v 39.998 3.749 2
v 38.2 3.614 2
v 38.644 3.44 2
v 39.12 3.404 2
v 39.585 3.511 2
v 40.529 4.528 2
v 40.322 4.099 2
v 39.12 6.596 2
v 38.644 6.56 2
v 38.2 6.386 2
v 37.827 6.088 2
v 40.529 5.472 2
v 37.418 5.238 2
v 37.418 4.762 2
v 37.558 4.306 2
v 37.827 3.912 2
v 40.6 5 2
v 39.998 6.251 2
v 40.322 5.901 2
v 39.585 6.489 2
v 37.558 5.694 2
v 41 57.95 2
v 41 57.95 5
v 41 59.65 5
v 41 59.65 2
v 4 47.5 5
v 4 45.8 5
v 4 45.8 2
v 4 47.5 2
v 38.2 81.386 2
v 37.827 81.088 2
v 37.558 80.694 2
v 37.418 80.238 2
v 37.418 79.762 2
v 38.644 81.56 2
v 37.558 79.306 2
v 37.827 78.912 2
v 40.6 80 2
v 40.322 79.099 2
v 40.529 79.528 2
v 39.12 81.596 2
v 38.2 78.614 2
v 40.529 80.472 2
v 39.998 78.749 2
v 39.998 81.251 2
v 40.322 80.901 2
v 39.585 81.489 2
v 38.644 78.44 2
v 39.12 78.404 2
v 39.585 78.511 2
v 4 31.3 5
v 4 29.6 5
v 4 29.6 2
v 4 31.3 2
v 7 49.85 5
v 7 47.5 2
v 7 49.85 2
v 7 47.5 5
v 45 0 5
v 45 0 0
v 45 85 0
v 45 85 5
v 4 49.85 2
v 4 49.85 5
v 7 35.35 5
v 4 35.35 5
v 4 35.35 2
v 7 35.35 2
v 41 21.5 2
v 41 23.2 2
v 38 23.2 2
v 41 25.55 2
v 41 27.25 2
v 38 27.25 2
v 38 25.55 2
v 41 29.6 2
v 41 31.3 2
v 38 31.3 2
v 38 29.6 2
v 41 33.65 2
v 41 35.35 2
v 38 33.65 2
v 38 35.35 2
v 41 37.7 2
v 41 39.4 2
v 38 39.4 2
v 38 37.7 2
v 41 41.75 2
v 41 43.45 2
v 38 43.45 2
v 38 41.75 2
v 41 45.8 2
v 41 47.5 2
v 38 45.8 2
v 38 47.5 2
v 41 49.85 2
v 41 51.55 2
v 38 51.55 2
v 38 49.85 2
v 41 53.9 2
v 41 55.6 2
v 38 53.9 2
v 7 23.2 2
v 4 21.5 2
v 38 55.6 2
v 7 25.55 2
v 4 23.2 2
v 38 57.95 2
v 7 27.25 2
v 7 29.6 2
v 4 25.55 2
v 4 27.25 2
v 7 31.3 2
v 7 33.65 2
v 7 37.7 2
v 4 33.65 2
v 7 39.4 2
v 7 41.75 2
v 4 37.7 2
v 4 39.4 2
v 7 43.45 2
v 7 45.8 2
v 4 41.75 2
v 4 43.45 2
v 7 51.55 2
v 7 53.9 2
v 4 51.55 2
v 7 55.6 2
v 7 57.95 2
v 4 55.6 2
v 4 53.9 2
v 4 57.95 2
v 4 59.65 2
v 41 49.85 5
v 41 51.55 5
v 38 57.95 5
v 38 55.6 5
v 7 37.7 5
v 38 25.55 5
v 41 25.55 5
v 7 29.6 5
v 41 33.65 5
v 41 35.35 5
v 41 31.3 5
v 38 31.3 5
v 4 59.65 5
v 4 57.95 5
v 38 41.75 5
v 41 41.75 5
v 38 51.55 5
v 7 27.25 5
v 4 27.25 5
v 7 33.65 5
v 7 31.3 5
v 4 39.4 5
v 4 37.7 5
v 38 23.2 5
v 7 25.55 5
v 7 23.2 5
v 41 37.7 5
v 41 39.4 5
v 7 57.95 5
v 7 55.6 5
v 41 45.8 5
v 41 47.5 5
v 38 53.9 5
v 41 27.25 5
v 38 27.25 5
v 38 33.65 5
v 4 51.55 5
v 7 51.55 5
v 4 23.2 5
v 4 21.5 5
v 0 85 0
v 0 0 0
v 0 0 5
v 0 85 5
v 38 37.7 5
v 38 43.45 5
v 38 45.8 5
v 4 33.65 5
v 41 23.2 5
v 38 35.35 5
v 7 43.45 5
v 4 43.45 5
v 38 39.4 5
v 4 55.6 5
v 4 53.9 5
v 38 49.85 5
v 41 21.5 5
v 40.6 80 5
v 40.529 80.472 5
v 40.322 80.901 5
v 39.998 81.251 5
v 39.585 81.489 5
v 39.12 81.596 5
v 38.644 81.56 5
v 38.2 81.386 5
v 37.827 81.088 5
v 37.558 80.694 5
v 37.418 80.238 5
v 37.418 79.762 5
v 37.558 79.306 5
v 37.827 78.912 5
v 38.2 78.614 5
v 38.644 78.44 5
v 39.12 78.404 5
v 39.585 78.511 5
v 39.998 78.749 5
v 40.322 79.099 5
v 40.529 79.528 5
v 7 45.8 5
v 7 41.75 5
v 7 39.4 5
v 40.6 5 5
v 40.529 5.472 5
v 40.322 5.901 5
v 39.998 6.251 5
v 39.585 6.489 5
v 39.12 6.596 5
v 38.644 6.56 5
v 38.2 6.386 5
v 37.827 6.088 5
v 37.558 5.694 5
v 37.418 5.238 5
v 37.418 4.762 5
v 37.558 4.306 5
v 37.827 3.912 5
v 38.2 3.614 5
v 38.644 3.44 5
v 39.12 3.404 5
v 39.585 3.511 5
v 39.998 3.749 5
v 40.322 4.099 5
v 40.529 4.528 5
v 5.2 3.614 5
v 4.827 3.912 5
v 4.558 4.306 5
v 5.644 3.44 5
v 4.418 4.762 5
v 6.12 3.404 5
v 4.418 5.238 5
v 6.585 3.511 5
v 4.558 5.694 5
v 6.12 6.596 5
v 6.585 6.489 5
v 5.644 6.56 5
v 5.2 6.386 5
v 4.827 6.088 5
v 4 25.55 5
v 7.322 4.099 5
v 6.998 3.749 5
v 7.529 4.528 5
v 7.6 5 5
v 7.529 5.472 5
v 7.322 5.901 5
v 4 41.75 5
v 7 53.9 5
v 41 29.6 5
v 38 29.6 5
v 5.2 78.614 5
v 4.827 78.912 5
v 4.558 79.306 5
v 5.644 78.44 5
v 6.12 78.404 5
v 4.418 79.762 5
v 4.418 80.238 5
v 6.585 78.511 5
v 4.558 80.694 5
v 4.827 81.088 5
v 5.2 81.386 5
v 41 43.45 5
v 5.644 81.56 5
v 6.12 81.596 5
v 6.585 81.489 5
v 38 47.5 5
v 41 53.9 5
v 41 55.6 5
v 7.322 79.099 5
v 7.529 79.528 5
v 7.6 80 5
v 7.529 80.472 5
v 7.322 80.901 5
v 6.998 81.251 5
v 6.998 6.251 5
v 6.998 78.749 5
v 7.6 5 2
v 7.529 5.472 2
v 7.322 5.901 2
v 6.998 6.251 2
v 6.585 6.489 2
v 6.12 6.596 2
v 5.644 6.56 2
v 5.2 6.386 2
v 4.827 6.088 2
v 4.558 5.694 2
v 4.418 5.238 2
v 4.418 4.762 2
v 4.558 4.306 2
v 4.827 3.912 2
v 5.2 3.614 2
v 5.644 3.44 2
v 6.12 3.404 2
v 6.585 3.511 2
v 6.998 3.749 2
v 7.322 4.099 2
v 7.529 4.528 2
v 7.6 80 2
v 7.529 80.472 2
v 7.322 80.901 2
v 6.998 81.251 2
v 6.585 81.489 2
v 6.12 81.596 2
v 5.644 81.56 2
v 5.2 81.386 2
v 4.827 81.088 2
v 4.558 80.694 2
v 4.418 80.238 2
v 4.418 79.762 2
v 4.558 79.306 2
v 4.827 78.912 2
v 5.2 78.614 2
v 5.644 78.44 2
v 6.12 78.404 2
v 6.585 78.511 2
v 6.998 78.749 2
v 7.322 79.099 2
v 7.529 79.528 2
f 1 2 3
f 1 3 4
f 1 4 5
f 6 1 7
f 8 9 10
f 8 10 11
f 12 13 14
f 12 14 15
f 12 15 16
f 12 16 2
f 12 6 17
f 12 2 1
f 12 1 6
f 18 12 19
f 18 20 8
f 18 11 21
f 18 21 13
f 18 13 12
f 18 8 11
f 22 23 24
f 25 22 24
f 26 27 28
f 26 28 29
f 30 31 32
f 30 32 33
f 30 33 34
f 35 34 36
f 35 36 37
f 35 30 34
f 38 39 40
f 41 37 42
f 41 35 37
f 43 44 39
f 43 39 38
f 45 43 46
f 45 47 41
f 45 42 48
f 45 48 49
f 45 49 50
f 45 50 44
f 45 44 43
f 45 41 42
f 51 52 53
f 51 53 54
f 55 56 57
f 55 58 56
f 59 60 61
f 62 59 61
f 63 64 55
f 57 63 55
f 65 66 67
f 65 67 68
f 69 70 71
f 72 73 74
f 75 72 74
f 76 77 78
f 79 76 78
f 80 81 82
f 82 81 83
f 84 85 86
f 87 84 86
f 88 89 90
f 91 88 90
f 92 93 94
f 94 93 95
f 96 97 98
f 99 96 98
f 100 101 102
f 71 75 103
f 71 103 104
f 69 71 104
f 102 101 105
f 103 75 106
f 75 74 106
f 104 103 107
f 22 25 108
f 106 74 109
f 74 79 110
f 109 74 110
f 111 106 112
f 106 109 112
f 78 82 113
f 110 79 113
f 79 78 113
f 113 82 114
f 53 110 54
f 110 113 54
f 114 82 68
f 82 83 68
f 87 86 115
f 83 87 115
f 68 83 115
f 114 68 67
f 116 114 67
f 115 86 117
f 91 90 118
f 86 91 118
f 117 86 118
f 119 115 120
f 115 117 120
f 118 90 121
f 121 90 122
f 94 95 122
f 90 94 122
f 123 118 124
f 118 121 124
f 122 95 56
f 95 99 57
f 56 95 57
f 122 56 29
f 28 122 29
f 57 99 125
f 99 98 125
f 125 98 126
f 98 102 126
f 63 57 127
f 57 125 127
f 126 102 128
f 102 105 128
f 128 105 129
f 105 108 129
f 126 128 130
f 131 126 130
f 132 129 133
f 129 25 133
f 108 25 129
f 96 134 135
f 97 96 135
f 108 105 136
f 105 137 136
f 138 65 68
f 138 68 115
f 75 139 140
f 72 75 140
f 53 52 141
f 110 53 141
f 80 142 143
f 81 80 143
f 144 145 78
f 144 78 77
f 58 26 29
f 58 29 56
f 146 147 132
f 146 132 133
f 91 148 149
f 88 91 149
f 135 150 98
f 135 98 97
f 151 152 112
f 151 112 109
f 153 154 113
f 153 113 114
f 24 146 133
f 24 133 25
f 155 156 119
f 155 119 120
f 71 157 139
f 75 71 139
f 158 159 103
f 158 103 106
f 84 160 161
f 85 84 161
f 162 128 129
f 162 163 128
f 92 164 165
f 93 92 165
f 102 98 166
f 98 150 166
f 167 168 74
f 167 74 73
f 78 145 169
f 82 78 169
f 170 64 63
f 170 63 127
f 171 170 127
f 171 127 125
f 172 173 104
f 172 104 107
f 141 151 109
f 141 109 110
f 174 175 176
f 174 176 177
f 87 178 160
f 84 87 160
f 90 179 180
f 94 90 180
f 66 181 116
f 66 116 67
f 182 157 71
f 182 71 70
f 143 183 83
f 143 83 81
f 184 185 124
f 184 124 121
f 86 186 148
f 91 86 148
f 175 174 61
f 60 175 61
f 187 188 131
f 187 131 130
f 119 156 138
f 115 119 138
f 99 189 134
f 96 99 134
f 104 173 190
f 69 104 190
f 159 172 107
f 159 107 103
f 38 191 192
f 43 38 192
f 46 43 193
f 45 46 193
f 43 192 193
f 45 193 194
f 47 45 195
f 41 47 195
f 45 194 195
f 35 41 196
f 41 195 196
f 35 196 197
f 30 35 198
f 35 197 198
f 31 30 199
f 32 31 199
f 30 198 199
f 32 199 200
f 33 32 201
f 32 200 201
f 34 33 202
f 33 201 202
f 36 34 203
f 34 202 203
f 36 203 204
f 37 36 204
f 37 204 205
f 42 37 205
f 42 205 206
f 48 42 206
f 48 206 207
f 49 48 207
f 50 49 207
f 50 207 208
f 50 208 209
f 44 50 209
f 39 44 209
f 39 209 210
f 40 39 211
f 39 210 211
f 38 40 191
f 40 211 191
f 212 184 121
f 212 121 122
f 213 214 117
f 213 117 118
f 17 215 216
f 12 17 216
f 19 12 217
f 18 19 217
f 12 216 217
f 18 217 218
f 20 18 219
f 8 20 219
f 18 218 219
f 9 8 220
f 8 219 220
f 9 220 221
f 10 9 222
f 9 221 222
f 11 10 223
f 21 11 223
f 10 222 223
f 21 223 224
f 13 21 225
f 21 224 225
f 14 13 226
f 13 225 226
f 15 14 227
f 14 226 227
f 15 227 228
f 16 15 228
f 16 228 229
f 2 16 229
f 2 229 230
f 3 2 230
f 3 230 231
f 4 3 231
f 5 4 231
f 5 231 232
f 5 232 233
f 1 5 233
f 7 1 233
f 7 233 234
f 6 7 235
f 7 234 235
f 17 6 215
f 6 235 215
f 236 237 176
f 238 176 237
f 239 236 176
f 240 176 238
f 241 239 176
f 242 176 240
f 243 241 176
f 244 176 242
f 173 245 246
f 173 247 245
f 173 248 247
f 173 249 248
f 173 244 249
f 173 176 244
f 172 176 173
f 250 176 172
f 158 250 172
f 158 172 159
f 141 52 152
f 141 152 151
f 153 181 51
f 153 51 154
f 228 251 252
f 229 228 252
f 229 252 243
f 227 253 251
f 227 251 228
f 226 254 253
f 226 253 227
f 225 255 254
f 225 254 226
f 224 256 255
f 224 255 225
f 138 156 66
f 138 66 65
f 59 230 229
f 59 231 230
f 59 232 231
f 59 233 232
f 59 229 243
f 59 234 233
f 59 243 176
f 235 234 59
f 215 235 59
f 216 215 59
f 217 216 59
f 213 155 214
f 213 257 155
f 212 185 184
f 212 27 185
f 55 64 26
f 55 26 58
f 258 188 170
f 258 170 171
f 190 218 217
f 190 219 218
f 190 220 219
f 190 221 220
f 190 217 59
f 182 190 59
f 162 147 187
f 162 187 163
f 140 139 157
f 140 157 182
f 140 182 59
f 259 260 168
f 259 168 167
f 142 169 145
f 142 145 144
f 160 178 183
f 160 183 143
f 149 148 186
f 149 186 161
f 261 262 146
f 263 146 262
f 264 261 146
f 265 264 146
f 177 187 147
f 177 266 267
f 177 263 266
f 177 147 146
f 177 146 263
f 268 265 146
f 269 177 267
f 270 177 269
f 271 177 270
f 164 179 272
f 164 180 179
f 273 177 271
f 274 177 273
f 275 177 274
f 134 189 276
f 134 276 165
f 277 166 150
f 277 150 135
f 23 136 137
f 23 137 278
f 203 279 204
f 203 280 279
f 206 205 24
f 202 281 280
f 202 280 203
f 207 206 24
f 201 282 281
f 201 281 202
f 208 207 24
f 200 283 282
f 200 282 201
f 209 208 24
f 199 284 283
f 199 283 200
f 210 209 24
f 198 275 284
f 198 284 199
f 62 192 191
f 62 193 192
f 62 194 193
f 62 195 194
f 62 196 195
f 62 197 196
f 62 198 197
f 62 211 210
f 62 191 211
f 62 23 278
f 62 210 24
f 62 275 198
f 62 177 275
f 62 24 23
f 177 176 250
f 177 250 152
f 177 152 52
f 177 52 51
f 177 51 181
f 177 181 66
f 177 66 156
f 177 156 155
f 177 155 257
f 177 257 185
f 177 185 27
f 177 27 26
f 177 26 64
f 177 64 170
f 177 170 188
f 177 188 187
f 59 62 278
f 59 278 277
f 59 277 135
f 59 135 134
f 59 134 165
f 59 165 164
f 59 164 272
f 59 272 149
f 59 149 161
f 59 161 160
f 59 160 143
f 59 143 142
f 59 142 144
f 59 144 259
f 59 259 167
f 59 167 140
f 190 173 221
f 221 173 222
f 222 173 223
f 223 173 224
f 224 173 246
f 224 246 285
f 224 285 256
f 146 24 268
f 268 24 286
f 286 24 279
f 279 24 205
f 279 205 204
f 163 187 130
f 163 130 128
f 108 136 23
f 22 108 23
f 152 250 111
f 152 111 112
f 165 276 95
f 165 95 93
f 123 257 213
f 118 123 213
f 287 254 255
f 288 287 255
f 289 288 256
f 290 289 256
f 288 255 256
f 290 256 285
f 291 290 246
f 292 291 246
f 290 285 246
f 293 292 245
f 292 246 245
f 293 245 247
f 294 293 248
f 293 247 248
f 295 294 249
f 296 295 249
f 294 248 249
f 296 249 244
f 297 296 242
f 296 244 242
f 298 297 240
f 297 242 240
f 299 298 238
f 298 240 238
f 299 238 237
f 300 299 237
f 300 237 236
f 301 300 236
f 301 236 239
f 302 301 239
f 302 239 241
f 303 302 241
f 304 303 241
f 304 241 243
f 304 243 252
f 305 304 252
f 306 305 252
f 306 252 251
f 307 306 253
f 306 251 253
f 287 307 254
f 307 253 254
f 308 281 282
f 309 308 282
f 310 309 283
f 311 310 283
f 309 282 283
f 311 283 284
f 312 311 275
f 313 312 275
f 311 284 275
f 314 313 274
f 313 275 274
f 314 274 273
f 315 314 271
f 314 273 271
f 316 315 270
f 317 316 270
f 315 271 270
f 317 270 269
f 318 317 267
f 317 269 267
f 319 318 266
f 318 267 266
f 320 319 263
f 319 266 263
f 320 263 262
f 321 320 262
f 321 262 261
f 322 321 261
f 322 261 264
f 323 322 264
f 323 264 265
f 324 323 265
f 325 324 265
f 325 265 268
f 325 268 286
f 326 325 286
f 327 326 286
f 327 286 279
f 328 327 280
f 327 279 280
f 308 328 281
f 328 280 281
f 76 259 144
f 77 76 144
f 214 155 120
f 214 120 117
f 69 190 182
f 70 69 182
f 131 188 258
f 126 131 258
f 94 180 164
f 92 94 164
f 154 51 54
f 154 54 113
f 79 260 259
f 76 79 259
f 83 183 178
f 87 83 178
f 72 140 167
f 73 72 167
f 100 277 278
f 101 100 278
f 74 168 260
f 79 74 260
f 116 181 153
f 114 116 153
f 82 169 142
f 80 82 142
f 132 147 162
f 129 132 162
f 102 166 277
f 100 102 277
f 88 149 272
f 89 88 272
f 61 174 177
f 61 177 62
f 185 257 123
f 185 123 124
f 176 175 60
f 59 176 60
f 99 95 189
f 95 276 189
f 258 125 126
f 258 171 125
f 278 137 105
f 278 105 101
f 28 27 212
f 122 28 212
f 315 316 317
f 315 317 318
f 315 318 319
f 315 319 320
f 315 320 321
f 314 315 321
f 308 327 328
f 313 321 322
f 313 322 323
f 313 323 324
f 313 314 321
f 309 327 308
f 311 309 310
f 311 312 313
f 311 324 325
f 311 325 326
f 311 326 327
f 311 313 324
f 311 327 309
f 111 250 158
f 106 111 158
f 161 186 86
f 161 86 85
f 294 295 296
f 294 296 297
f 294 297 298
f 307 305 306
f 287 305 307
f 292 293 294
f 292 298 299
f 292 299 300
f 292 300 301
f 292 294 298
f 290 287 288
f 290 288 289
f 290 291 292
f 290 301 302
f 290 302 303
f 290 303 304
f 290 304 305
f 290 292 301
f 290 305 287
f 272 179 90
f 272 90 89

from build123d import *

# Parameters (mm, degrees)
SKIZZE1_W                       = 45
SKIZZE1_H                       = 85
AUFSATZ_LINEAR_AUSTRAGEN1_DEPTH = 5
SKIZZE6_R                       = 1.6
SCHNITT_LINEAR_AUSTRAGEN2_DEPTH = 3
SKIZZE7_W                       = 37
SKIZZE7_H                       = 1.7
SCHNITT_LINEAR_AUSTRAGEN3_DEPTH = 10
SKIZZE8_W                       = 31
SKIZZE8_H                       = 38.15
SCHNITT_LINEAR_AUSTRAGEN4_DEPTH = 10
SKIZZE9_W                       = 38.051320542
SKIZZE9_H                       = 40.768170305
AUFSATZ_LINEAR_AUSTRAGEN2_DEPTH = 2


with BuildPart() as part:
    # Skizze1 → Aufsatz-Linear austragen1 (new body)
    with BuildSketch(Plane.XY):
        with Locations((22.5, 42.5)):
            Rectangle(SKIZZE1_W, SKIZZE1_H)
    extrude(amount=AUFSATZ_LINEAR_AUSTRAGEN1_DEPTH)

    # Skizze6 → Schnitt-Linear austragen2 (cut)
    with BuildSketch(Plane.XY.offset(5)):
        with Locations((6, 80)):
            Circle(SKIZZE6_R)
        with Locations((39, 80)):
            Circle(SKIZZE6_R)
        with Locations((39, 5)):
            Circle(SKIZZE6_R)
        with Locations((6, 5)):
            Circle(SKIZZE6_R)
    extrude(amount=-SCHNITT_LINEAR_AUSTRAGEN2_DEPTH, mode=Mode.SUBTRACT)

    # Skizze7 → Schnitt-Linear austragen3 (cut)
    with BuildSketch(Plane.XY.offset(5)):
        with Locations((22.5, 58.8)):
            Rectangle(SKIZZE7_W, SKIZZE7_H)
        with Locations((22.5, 54.75)):
            Rectangle(SKIZZE7_W, SKIZZE7_H)
        with Locations((22.5, 50.7)):
            Rectangle(SKIZZE7_W, SKIZZE7_H)
        with Locations((22.5, 46.65)):
            Rectangle(SKIZZE7_W, SKIZZE7_H)
        with Locations((22.5, 42.6)):
            Rectangle(SKIZZE7_W, SKIZZE7_H)
        with Locations((22.5, 38.55)):
            Rectangle(SKIZZE7_W, SKIZZE7_H)
        with Locations((22.5, 34.5)):
            Rectangle(SKIZZE7_W, SKIZZE7_H)
        with Locations((22.5, 30.45)):
            Rectangle(SKIZZE7_W, SKIZZE7_H)
        with Locations((22.5, 26.4)):
            Rectangle(SKIZZE7_W, SKIZZE7_H)
        with Locations((22.5, 22.35)):
            Rectangle(SKIZZE7_W, SKIZZE7_H)
    extrude(amount=-SCHNITT_LINEAR_AUSTRAGEN3_DEPTH, mode=Mode.SUBTRACT)

    # Skizze8 → Schnitt-Linear austragen4 (cut)
    with BuildSketch(Plane.XY.offset(5)):
        with Locations((22.5, 40.575)):
            Rectangle(SKIZZE8_W, SKIZZE8_H)
    extrude(amount=-SCHNITT_LINEAR_AUSTRAGEN4_DEPTH, mode=Mode.SUBTRACT)

    # Skizze9 → Aufsatz-Linear austragen2 (add)
    with BuildSketch(Plane(origin=(0, 0, 0), x_dir=(-1, 0, 0), z_dir=(0, 0, -1))):
        with Locations((-22.316575494, 40.457263066)):
            Rectangle(SKIZZE9_W, SKIZZE9_H)
    extrude(amount=-AUFSATZ_LINEAR_AUSTRAGEN2_DEPTH)


solid = part.part
